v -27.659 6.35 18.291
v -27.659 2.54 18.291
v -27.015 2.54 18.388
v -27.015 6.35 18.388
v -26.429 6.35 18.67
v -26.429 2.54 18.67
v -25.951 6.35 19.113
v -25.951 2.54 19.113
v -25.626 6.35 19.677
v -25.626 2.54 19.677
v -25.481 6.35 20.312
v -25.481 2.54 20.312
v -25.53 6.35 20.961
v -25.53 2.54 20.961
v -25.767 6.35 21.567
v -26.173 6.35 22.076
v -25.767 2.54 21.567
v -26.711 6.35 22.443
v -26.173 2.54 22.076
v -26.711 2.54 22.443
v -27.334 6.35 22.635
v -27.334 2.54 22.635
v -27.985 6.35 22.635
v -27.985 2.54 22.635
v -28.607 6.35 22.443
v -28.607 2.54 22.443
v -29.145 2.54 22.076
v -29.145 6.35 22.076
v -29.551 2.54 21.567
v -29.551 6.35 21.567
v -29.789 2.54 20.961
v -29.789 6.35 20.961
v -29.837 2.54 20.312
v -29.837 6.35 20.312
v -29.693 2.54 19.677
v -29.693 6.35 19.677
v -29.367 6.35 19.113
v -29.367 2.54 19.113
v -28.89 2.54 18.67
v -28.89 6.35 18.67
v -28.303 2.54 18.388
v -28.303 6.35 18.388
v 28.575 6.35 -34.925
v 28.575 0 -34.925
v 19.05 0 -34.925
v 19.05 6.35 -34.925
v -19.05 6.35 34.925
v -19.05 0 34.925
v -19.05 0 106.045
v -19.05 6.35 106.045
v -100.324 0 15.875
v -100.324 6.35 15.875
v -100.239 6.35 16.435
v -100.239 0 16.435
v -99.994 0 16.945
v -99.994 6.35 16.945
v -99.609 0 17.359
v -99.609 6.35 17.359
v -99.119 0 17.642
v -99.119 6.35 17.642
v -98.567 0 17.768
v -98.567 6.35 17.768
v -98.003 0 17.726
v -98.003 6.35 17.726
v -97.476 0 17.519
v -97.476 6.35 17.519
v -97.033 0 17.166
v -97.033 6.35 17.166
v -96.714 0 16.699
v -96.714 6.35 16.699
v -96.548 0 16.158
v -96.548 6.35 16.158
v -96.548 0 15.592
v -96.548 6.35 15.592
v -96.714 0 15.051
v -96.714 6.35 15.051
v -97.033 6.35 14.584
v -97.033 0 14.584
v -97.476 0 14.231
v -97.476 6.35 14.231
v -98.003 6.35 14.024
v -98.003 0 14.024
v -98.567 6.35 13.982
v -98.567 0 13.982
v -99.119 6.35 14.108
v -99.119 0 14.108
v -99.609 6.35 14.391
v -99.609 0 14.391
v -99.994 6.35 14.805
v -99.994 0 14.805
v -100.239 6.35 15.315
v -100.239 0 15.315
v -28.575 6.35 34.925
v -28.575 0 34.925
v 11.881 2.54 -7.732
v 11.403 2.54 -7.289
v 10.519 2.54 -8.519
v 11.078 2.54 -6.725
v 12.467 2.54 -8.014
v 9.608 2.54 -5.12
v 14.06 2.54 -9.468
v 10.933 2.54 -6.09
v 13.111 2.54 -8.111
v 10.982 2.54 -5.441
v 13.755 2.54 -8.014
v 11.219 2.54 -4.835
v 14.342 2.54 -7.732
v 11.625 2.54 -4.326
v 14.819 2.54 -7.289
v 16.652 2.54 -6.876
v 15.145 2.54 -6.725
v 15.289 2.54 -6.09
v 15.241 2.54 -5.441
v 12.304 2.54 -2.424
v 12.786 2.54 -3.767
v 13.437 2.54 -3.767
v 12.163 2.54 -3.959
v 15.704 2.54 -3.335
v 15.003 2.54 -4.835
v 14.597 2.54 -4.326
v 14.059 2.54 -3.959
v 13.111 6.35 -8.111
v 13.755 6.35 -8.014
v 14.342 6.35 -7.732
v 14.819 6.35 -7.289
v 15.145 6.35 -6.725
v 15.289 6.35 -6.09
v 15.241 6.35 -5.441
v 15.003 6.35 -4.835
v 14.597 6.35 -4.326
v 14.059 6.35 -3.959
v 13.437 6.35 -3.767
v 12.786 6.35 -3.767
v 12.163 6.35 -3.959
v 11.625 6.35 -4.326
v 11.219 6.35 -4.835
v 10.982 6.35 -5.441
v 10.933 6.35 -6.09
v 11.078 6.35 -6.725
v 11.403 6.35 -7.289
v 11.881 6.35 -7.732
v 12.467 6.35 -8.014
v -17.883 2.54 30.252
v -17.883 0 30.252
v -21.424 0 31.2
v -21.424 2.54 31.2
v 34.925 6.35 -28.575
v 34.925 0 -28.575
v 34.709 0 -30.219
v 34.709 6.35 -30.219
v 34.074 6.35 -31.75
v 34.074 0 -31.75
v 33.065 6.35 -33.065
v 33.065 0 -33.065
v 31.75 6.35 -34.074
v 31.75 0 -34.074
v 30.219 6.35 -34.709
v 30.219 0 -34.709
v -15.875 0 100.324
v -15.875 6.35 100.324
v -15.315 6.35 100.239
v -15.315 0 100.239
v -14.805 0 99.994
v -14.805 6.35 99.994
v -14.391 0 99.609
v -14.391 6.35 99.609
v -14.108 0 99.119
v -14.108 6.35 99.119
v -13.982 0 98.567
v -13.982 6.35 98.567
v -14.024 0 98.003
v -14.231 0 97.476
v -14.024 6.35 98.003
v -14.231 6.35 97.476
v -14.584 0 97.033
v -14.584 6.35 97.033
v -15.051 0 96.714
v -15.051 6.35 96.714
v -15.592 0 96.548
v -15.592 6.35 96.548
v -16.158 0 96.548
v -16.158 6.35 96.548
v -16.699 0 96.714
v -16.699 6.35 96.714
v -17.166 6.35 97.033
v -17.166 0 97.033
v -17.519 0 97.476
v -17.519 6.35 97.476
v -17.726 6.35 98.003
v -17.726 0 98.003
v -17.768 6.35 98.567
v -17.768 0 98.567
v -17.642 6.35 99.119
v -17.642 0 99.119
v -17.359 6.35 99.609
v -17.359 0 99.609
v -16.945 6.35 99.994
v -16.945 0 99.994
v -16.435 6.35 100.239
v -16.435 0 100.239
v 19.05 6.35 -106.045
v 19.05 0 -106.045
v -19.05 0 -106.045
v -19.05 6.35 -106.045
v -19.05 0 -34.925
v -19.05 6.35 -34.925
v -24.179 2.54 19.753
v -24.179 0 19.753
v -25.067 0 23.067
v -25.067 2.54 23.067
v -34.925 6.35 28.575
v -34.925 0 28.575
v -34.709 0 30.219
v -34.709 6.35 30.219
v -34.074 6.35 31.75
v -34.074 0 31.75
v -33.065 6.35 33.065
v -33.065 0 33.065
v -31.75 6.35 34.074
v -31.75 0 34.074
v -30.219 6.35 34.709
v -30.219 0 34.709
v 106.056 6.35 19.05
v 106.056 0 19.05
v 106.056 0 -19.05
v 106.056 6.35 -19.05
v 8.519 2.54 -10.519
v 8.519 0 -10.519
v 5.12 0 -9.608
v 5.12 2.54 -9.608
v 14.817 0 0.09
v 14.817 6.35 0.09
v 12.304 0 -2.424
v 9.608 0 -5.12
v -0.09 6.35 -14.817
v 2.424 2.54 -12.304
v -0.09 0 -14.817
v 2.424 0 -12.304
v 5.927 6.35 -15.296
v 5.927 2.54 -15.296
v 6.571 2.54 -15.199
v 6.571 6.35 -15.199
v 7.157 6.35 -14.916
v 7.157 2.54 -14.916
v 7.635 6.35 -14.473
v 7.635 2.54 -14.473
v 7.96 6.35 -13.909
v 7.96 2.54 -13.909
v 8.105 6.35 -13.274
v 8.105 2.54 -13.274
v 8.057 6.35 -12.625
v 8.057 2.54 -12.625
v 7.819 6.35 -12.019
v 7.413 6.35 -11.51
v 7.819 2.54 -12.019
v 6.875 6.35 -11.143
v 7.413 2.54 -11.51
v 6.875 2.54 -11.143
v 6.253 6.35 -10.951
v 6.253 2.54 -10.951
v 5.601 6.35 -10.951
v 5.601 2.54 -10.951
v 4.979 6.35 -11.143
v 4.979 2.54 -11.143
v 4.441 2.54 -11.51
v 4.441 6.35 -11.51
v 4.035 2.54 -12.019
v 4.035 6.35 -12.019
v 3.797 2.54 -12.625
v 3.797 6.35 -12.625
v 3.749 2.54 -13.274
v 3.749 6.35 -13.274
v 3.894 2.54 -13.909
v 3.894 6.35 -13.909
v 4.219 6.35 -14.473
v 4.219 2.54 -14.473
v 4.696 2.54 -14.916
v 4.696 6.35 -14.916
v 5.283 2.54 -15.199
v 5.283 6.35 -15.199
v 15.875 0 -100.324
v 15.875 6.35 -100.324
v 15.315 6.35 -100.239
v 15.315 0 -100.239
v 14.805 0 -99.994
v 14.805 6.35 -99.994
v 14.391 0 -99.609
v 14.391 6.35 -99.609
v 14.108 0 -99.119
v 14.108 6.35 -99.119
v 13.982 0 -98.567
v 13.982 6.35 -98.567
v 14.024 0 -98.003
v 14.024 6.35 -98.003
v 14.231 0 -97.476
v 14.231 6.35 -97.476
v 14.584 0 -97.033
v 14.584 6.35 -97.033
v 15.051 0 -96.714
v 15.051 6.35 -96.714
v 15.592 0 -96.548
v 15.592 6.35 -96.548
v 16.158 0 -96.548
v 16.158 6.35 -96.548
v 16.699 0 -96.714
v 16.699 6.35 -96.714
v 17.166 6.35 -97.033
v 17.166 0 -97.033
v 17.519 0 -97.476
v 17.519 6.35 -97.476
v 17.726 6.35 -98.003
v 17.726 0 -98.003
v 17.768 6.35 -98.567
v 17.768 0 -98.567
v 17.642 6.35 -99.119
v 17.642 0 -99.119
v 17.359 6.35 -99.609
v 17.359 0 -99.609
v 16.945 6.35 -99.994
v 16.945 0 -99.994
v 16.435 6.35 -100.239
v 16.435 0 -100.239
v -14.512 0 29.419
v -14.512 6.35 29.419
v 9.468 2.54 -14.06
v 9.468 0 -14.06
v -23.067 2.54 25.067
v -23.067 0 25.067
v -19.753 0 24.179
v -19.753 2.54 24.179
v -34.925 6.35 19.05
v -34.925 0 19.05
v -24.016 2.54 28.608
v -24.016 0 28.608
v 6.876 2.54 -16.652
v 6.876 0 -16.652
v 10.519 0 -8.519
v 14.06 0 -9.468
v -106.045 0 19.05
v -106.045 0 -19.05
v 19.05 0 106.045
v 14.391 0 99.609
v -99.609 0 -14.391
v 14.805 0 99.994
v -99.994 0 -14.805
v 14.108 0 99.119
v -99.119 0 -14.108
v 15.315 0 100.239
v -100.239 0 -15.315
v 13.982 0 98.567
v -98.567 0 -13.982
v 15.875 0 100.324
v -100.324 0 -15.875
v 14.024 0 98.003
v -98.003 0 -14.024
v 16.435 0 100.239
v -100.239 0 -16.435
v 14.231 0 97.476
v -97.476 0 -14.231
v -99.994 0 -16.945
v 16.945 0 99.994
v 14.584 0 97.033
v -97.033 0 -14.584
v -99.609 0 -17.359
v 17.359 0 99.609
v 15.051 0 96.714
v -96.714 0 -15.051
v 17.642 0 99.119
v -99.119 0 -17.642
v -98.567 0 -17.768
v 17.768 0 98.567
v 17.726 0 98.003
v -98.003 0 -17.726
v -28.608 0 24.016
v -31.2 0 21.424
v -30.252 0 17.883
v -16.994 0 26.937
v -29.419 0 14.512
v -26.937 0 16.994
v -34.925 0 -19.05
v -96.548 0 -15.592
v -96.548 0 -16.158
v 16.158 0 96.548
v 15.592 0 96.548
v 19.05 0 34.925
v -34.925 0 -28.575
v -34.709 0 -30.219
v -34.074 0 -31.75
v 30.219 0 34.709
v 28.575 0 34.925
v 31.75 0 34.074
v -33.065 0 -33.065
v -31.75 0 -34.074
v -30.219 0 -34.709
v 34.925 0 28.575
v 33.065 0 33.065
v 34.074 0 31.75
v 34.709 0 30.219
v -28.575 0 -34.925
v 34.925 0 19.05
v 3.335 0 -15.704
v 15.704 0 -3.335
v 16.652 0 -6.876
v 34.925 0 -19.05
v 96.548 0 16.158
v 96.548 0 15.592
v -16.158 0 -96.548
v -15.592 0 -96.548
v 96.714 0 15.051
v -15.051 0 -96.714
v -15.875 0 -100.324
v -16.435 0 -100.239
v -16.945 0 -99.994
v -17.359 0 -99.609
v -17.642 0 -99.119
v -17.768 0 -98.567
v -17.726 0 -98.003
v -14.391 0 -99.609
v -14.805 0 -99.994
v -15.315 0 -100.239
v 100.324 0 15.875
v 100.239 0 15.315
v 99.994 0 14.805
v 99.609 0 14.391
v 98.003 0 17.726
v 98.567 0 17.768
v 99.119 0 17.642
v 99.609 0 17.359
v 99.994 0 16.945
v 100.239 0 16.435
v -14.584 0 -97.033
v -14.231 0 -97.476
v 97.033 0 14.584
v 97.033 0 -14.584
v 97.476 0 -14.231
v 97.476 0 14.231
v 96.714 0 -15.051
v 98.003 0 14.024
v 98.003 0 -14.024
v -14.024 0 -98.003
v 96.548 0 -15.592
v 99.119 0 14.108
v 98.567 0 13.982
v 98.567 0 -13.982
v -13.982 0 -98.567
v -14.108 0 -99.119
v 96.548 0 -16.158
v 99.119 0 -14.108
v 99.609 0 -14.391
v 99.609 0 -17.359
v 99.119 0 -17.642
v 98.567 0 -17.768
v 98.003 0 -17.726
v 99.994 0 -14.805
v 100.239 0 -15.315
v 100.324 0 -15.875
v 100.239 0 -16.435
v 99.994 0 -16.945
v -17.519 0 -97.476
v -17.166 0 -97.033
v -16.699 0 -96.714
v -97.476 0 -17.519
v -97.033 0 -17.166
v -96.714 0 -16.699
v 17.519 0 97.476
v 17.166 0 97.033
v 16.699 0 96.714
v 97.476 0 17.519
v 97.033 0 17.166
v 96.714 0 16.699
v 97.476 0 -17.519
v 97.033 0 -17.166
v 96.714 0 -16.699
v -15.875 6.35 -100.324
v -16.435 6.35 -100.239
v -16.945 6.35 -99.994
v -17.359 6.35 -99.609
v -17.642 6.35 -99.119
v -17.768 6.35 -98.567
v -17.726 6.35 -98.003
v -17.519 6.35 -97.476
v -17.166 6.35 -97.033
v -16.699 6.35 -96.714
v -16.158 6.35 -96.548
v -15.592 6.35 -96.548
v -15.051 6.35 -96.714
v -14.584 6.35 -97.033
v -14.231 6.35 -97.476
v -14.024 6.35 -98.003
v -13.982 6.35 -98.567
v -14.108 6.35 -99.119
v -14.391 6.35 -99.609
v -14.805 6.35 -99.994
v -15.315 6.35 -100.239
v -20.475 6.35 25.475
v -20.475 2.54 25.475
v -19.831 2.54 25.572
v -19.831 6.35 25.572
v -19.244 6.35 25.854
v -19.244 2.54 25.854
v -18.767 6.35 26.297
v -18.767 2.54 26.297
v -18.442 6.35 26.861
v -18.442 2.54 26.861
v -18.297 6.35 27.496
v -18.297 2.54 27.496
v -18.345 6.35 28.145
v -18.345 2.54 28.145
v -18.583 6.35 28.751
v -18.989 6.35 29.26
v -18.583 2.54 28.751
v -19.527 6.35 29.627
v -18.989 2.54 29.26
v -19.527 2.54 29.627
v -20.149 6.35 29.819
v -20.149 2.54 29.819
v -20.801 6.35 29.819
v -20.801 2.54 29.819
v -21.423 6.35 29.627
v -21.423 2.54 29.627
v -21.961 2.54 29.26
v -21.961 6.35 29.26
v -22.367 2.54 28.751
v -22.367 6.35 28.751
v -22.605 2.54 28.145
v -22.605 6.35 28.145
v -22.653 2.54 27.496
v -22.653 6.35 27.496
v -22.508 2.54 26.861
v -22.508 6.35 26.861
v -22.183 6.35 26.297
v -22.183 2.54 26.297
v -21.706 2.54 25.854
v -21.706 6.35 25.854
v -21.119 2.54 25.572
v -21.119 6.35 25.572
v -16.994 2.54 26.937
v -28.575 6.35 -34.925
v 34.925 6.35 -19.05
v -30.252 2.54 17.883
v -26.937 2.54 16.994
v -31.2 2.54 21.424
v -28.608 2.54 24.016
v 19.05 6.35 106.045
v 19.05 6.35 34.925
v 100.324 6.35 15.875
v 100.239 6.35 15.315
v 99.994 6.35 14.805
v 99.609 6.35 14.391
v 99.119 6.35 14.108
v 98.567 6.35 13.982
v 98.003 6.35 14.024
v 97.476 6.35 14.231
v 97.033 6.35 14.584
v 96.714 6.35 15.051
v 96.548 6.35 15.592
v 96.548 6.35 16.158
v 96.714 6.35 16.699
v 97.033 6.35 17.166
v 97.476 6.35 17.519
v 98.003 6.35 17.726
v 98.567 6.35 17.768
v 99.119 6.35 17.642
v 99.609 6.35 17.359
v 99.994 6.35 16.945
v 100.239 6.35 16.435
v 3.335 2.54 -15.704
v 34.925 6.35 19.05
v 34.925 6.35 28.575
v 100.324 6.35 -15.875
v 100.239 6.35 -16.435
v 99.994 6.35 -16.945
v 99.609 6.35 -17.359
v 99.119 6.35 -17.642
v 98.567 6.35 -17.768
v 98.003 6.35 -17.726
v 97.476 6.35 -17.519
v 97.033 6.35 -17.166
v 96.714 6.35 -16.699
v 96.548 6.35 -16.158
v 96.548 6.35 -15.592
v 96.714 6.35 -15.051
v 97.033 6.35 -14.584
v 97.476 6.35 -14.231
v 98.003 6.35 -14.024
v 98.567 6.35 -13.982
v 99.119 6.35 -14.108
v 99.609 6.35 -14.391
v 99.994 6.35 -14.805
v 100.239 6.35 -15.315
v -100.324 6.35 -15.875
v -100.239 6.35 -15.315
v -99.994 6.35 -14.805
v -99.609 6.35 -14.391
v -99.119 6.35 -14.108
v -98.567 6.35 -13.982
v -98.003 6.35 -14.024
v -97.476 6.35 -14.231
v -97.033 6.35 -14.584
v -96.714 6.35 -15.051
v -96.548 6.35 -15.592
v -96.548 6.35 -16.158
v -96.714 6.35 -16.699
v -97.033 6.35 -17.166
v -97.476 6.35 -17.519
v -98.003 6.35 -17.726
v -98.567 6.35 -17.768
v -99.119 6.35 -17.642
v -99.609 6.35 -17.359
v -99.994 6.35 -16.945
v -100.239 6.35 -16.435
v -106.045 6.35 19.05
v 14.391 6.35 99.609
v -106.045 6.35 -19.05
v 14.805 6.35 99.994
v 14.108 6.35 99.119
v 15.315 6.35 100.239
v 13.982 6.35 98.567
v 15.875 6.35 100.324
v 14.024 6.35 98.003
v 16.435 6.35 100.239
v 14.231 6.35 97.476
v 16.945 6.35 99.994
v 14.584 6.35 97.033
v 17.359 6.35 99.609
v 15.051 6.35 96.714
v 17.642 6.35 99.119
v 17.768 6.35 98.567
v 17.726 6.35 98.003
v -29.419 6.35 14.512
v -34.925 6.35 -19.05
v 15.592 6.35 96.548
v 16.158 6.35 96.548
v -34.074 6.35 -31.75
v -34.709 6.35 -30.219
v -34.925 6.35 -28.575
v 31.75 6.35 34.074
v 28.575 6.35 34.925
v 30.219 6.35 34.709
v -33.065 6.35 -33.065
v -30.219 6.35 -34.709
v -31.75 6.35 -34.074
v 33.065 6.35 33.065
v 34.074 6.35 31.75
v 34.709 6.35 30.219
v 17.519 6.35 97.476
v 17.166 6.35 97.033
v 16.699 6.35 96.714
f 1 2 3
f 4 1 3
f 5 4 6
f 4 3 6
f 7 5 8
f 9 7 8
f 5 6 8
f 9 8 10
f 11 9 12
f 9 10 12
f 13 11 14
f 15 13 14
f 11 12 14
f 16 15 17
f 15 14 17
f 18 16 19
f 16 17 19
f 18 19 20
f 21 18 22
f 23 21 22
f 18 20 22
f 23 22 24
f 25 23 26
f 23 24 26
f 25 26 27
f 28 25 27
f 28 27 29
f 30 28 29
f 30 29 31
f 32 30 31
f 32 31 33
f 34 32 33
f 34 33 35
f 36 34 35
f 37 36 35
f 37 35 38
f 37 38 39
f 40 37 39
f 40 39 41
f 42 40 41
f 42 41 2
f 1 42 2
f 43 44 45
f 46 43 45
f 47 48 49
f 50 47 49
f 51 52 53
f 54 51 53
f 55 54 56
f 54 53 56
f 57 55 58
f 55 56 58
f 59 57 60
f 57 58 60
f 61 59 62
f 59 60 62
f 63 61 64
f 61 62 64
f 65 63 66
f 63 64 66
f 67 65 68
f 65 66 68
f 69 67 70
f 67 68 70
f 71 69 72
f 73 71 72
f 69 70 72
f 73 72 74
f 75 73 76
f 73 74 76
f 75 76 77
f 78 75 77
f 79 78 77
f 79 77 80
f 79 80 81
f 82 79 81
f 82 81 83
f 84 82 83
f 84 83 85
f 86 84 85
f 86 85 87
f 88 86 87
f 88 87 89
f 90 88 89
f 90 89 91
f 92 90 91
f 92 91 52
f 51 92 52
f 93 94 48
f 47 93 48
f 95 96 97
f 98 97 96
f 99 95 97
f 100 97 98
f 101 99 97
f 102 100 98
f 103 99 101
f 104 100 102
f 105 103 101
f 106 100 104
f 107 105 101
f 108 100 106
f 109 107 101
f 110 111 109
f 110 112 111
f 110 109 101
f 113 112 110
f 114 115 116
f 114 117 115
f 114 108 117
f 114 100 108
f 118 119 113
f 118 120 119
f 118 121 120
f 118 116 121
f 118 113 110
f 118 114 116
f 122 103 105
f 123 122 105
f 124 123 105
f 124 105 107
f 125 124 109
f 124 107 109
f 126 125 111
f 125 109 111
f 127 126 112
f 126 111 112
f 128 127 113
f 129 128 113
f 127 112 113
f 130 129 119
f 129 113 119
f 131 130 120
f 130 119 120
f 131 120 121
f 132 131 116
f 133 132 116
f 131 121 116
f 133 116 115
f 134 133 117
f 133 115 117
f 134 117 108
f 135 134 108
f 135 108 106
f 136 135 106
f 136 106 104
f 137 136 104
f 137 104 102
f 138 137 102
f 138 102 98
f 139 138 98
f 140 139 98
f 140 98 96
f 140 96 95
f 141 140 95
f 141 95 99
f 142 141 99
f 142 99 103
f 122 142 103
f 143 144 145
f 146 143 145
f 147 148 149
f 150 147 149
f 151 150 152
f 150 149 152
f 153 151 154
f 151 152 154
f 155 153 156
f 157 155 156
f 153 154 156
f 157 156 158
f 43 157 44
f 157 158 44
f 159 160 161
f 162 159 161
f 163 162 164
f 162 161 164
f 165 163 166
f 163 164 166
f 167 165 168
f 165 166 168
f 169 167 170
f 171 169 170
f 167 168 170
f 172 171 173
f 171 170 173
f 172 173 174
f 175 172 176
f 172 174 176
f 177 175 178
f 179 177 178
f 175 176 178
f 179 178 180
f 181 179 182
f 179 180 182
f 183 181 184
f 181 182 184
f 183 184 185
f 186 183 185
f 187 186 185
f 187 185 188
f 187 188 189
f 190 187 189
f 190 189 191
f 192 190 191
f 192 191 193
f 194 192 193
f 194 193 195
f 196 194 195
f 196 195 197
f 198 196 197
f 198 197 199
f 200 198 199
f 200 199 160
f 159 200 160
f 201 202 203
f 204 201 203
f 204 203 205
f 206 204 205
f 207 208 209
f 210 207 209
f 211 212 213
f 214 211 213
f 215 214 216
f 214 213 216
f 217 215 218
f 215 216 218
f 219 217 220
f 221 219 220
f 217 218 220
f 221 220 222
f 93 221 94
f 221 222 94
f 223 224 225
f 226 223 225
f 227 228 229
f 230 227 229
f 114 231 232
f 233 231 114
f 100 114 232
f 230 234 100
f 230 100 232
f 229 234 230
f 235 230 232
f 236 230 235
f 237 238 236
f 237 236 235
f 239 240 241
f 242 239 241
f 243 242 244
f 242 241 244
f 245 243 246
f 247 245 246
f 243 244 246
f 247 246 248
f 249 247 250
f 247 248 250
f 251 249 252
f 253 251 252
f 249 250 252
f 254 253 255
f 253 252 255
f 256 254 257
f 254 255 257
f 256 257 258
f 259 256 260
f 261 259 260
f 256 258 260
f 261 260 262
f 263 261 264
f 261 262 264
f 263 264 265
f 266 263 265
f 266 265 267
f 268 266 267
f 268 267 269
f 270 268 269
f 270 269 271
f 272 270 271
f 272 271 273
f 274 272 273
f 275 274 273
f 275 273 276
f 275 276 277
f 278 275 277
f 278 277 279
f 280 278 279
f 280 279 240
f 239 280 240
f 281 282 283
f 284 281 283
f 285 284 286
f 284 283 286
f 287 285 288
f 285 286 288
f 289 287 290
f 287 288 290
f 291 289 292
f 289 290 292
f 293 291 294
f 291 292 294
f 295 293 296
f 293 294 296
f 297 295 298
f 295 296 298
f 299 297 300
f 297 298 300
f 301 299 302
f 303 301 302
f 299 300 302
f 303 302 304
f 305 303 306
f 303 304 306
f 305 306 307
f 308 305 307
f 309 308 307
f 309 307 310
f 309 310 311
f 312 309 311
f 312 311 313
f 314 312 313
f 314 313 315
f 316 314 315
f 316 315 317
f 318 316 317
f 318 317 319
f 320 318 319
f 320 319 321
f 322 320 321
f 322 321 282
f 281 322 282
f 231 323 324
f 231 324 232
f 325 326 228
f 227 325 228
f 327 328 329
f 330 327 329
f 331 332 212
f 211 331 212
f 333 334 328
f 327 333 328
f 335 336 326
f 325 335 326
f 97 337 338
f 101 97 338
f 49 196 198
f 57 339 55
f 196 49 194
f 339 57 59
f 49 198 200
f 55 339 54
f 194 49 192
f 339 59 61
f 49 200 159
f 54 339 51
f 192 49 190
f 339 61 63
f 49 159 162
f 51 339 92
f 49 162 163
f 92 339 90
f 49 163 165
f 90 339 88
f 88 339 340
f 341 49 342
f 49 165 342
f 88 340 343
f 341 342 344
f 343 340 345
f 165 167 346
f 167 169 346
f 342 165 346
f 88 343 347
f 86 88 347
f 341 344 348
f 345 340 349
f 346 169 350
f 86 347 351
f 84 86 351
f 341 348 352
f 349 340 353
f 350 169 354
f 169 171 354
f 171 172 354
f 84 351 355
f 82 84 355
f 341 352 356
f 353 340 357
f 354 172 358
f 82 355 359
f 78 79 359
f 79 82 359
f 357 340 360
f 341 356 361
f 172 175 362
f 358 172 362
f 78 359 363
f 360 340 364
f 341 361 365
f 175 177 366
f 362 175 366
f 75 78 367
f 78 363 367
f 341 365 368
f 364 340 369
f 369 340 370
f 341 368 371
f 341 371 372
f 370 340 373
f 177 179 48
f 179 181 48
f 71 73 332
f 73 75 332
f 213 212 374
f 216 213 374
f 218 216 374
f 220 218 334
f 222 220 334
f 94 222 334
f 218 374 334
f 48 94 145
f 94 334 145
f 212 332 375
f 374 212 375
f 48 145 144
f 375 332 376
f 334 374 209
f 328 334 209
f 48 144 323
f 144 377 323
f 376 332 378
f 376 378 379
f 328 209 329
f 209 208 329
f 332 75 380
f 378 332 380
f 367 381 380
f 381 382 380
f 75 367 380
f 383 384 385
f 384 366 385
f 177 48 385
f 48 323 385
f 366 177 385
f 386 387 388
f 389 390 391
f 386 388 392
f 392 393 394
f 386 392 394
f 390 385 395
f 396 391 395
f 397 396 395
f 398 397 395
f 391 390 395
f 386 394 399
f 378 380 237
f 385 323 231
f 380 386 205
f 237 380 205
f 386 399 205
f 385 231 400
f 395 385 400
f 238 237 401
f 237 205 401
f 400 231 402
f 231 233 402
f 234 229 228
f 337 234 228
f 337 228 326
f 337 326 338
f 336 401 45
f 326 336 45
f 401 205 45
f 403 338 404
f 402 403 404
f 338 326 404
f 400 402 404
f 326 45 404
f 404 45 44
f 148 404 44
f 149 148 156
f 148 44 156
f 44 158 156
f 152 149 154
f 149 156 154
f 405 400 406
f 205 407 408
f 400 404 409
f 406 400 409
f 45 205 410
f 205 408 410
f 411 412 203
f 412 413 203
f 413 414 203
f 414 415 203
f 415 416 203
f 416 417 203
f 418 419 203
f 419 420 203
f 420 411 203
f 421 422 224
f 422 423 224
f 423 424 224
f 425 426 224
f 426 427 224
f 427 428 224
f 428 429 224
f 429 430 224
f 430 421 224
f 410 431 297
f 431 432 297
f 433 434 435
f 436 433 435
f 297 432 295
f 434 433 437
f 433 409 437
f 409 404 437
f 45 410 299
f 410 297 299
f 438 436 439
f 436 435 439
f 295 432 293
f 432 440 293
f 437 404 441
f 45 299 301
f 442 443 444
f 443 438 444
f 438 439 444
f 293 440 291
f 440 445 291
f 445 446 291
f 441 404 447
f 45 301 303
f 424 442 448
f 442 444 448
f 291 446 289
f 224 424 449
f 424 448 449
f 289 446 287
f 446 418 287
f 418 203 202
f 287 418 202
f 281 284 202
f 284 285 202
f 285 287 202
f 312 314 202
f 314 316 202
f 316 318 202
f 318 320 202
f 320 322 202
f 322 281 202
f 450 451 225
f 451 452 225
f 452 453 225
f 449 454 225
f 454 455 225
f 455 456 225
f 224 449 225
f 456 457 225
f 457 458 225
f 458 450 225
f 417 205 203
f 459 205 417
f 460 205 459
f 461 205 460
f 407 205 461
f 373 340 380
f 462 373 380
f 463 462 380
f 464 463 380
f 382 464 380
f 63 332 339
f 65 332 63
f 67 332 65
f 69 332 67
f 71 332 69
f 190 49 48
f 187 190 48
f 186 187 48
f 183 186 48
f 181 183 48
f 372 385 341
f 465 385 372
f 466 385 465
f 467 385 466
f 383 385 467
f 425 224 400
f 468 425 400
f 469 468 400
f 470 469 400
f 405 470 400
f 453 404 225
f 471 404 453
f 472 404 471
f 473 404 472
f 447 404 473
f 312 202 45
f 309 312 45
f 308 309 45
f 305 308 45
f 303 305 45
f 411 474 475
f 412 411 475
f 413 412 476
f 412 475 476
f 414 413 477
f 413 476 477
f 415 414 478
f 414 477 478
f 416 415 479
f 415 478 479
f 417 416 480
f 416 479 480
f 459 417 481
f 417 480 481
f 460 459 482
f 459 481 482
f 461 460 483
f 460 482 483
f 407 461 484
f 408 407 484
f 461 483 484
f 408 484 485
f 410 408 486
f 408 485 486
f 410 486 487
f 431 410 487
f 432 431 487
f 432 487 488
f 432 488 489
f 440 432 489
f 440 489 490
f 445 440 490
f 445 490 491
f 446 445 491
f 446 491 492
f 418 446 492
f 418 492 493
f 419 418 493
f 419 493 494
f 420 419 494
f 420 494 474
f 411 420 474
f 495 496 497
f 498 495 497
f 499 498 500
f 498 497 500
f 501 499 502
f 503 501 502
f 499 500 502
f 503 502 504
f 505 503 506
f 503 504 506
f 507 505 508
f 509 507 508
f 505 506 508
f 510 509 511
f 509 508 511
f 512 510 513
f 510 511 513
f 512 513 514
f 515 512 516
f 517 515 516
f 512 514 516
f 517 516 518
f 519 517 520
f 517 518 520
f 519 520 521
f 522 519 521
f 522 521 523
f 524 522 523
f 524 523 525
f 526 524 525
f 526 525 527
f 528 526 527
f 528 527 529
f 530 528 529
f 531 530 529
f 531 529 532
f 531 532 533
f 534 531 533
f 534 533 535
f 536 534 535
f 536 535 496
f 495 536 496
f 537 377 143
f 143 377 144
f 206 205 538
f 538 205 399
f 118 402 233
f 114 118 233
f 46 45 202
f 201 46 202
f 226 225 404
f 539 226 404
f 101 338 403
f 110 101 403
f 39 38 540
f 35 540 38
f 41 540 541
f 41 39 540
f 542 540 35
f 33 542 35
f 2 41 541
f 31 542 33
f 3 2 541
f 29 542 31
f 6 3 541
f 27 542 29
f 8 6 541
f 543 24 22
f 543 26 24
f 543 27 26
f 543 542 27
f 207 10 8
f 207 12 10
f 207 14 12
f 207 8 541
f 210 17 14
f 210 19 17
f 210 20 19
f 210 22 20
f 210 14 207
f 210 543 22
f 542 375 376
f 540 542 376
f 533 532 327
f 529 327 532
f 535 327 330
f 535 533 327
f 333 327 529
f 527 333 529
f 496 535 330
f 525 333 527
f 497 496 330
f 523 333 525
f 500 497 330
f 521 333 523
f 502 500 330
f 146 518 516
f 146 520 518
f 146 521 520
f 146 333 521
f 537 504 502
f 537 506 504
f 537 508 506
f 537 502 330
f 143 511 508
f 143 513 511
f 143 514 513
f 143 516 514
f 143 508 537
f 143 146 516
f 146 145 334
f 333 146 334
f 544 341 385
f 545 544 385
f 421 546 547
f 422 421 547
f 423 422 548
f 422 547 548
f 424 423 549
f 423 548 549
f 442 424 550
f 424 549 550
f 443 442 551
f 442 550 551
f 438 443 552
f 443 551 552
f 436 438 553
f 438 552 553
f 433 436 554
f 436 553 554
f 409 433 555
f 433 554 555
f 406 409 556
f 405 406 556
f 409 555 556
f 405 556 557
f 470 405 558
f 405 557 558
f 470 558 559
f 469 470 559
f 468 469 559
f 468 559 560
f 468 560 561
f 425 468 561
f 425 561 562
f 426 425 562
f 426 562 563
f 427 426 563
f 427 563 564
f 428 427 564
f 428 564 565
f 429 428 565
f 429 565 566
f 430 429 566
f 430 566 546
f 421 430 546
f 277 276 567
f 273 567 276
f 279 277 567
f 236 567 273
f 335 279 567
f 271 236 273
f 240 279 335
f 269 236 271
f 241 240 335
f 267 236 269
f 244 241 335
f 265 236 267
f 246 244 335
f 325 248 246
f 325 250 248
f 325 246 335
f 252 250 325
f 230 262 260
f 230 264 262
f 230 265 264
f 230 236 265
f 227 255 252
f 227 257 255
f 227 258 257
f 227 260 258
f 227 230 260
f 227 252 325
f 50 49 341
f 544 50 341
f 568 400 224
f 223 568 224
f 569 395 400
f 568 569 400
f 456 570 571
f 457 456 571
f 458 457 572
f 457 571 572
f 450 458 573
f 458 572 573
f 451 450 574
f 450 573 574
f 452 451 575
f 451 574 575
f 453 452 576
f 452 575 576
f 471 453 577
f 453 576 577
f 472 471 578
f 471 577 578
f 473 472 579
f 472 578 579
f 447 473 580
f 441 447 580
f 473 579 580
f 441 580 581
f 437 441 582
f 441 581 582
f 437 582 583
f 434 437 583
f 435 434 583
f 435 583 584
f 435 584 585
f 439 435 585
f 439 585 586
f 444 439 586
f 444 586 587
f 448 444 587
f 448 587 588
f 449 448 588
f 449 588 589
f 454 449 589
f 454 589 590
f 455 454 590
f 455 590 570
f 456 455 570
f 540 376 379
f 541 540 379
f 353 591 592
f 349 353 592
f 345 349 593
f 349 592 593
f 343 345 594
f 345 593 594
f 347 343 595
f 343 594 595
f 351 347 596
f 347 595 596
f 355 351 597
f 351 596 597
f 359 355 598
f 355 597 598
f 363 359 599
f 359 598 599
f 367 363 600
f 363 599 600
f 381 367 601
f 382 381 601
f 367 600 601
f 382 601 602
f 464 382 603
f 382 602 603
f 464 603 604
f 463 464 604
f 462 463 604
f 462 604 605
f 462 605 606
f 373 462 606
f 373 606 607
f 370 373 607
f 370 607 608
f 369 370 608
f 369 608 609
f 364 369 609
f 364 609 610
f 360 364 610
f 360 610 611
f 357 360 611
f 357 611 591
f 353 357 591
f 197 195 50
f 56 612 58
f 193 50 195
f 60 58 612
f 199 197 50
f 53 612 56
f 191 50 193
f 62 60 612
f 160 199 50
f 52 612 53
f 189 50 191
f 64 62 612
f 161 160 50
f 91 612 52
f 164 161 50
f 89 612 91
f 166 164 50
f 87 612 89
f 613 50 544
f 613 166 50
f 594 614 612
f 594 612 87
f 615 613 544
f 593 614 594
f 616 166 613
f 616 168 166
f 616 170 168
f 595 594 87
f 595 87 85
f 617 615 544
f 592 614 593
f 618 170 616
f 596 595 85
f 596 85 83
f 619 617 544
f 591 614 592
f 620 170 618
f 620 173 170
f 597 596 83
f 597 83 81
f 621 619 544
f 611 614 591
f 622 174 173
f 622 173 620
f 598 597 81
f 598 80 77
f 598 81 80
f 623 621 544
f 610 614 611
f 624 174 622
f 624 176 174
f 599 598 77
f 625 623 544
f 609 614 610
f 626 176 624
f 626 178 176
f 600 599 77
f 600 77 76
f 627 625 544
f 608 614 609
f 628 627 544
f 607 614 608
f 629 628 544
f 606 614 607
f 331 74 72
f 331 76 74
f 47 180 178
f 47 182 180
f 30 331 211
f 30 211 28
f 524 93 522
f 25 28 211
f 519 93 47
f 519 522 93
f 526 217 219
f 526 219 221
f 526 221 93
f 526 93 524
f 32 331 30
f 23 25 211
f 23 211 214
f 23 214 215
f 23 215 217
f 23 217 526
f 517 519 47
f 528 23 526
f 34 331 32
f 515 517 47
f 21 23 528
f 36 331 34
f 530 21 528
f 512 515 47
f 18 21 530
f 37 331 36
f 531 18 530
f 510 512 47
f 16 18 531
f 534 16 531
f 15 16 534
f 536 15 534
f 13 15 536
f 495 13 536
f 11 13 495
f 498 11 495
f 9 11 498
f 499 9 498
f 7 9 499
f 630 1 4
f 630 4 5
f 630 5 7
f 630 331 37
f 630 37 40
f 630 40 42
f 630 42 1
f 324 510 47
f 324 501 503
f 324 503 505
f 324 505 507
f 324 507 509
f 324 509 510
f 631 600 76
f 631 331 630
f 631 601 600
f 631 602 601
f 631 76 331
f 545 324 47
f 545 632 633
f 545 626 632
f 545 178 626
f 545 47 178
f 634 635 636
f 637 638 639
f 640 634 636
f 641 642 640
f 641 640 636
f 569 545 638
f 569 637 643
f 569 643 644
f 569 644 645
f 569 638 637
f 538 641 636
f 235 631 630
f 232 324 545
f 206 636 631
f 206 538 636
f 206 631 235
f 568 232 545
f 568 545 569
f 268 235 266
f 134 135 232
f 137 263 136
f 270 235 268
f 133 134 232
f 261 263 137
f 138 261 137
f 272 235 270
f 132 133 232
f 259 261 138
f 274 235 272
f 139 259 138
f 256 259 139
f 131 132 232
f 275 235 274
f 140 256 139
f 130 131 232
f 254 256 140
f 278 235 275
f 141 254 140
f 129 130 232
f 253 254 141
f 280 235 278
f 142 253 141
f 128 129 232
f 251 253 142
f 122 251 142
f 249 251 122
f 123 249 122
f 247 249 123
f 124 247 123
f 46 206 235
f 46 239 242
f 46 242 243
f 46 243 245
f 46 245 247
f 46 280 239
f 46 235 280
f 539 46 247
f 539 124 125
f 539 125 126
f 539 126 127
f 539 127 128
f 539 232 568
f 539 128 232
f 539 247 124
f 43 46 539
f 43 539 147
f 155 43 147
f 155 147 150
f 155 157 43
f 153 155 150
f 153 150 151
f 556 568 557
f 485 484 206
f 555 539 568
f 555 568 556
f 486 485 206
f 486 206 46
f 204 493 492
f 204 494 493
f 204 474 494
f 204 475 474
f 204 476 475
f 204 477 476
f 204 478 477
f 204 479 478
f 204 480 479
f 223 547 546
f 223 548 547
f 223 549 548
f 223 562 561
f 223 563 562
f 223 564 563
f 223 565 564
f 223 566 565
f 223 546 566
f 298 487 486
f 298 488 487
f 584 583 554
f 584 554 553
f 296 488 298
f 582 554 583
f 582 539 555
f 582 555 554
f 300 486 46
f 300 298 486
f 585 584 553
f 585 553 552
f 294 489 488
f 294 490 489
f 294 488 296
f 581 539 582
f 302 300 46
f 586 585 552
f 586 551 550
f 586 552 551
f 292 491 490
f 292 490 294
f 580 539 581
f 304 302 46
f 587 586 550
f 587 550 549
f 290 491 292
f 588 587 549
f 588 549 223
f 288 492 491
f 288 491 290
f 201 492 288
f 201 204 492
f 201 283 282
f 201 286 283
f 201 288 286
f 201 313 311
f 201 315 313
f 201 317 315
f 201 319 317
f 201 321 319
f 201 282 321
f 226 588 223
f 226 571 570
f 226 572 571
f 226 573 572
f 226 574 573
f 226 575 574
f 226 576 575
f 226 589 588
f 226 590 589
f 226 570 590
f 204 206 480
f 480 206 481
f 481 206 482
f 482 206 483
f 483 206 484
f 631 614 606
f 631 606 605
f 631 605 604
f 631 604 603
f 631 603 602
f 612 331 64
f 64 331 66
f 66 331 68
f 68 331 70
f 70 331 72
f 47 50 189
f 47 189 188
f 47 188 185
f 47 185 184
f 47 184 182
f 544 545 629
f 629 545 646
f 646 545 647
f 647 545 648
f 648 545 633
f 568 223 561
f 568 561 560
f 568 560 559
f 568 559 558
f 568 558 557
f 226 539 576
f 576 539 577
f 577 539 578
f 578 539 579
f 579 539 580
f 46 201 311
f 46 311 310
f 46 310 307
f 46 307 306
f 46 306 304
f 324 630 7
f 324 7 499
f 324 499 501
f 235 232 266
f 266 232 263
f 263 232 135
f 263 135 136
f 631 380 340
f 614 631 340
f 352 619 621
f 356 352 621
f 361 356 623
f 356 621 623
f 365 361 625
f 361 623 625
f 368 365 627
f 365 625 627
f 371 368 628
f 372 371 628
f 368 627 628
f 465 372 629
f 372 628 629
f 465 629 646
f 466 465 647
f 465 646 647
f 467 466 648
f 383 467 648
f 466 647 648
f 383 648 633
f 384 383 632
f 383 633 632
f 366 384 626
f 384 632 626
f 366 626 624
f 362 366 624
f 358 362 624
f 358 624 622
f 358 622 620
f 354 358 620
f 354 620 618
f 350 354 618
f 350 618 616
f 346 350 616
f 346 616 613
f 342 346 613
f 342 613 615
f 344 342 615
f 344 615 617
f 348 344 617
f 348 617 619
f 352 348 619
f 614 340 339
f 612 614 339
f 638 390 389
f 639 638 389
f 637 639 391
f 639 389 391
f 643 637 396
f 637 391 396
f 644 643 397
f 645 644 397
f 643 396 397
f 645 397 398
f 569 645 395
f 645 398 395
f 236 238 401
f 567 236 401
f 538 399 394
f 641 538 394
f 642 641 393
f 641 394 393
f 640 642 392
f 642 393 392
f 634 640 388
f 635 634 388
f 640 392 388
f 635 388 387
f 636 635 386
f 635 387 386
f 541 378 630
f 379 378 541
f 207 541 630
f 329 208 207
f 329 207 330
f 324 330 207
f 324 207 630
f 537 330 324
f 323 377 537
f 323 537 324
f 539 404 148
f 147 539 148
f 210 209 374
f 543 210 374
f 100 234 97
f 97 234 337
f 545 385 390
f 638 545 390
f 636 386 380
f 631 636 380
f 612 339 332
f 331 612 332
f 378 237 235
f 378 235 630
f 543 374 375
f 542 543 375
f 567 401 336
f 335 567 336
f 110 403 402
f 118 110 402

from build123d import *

# Parameters (mm, degrees)
BOSS_EXTRU_1_DEPTH           = 6.35
ENL_V_MAT_EXTRU_1_REACH      = 152.112
ESQUISSE2_R                  = 2.1844
ENL_V_MAT_EXTRU_2_DEPTH      = 2.54
ENL_V_MAT_EXTRU_3_REACH      = 152.112
ESQUISSE5_R                  = 1.89865
ENL_V_MAT_EXTRU_4_DEPTH      = 151.112071772
R_P_TITION_CIRCULAIRE1_COUNT = 4


with BuildPart() as part:
    # Esquisse1 → Boss.-Extru.1 (new body)
    with BuildSketch(Plane(origin=(0, 0, 0), x_dir=(1, 0, 0), z_dir=(0, 1, 0))):
        with BuildLine():
            Line((19.049999994, 106.045), (-19.050000006, 106.045))
            Line((-19.050000006, 106.045), (-19.050000006, 34.925))
            Line((-19.050000006, 34.925), (-28.575, 34.925))
            ThreePointArc((-28.575, 34.925), (-33.065128061, 33.065128061), (-34.925, 28.575))
            Line((-34.925, 28.575), (-34.925, 19.05))
            Line((-34.925, 19.05), (-106.045, 19.05))
            Line((-106.045, 19.05), (-106.045, -19.05))
            Line((-106.045, -19.05), (-34.925, -19.05))
            Line((-34.925, -19.05), (-34.925, -28.575))
            ThreePointArc((-34.925, -28.575), (-33.065128061, -33.065128061), (-28.575, -34.925))
            Line((-28.575, -34.925), (-19.05, -34.925))
            Line((-19.05, -34.925), (-19.05, -106.045))
            Line((-19.05, -106.045), (19.05, -106.045))
            Line((19.05, -106.045), (19.05, -34.925))
            Line((19.05, -34.925), (28.575, -34.925))
            ThreePointArc((28.575, -34.925), (33.065128061, -33.065128061), (34.925, -28.575))
            Line((34.925, -28.575), (34.925, -19.05))
            Line((34.925, -19.05), (106.055502293, -19.05))
            Line((106.055502293, -19.05), (106.055502293, 19.05))
            Line((106.055502293, 19.05), (34.925, 19.05))
            Line((34.925, 19.05), (34.925, 28.575))
            ThreePointArc((34.925, 28.575), (33.065128061, 33.065128061), (28.575, 34.925))
            Line((28.575, 34.925), (19.049999994, 34.925))
            Line((19.049999994, 34.925), (19.049999994, 106.045))
        make_face()
    extrude(amount=BOSS_EXTRU_1_DEPTH)

    # Esquisse2 → Enlèv. mat.-Extru.1 (cut, up to next)
    with BuildSketch(Plane.XZ, mode=Mode.PRIVATE) as enl_v_mat_extru_1_sk1:
        with Locations(Location((-20.474983956, 27.659188853, 0), (0, 0, 270))):
            Circle(ESQUISSE2_R)
    enl_v_mat_extru_1_tool1 = extrude(enl_v_mat_extru_1_sk1.sketch, amount=-ENL_V_MAT_EXTRU_1_REACH, mode=Mode.PRIVATE) & part.part
    # Esquisse2 → Enlèv. mat.-Extru.1 (cut, up to next)
    with BuildSketch(Plane.XZ, mode=Mode.PRIVATE) as enl_v_mat_extru_1_sk2:
        with Locations(Location((-27.659188853, 20.474983956, 0), (0, 0, 270))):
            Circle(ESQUISSE2_R)
    enl_v_mat_extru_1_tool2 = extrude(enl_v_mat_extru_1_sk2.sketch, amount=-ENL_V_MAT_EXTRU_1_REACH, mode=Mode.PRIVATE) & part.part
    # Esquisse2 → Enlèv. mat.-Extru.1 (cut, up to next)
    with BuildSketch(Plane.XZ, mode=Mode.PRIVATE) as enl_v_mat_extru_1_sk3:
        with Locations(Location((13.111173937, -5.92696904, 0), (0, 0, 270))):
            Circle(ESQUISSE2_R)
    enl_v_mat_extru_1_tool3 = extrude(enl_v_mat_extru_1_sk3.sketch, amount=-ENL_V_MAT_EXTRU_1_REACH, mode=Mode.PRIVATE) & part.part
    # Esquisse2 → Enlèv. mat.-Extru.1 (cut, up to next)
    with BuildSketch(Plane.XZ, mode=Mode.PRIVATE) as enl_v_mat_extru_1_sk4:
        with Locations(Location((5.92696904, -13.111173937, 0), (0, 0, 270))):
            Circle(ESQUISSE2_R)
    enl_v_mat_extru_1_tool4 = extrude(enl_v_mat_extru_1_sk4.sketch, amount=-ENL_V_MAT_EXTRU_1_REACH, mode=Mode.PRIVATE) & part.part
    add(enl_v_mat_extru_1_tool1.solids().sort_by_distance((-20.474984, 0, 27.659189))[0], mode=Mode.SUBTRACT)
    add(enl_v_mat_extru_1_tool2.solids().sort_by_distance((-27.659189, 0, 20.474984))[0], mode=Mode.SUBTRACT)
    add(enl_v_mat_extru_1_tool3.solids().sort_by_distance((13.111174, 0, -5.926969))[0], mode=Mode.SUBTRACT)
    add(enl_v_mat_extru_1_tool4.solids().sort_by_distance((5.926969, 0, -13.111174))[0], mode=Mode.SUBTRACT)

    # Esquisse3 → Enlèv. mat.-Extru.2 (cut)
    with BuildSketch(Plane.XZ):
        Polygon((16.652426289, -6.875844748), (15.703550581, -3.334592395), (12.162298229, -2.385716687), (9.569921584, -4.978093332), (10.518797292, -8.519345684), (14.060049645, -9.468221392), align=None)
        Polygon((9.468221392, -14.060049645), (8.519345684, -10.518797292), (4.978093332, -9.569921584), (2.385716687, -12.162298229), (3.334592395, -15.703550581), (6.875844748, -16.652426289), align=None)
        Polygon((-17.882607312, 30.251565497), (-21.423859664, 31.200441205), (-24.016236309, 28.608064561), (-23.0673606, 25.066812208), (-19.526108248, 24.1179365), (-16.933731604, 26.710313145), align=None)
        Polygon((-28.608064561, 24.016236309), (-31.200441205, 21.423859664), (-30.251565497, 17.882607312), (-26.710313145, 16.933731604), (-24.1179365, 19.526108248), (-25.066812208, 23.0673606), align=None)
    extrude(amount=-ENL_V_MAT_EXTRU_2_DEPTH, mode=Mode.SUBTRACT)

    # Esquisse4 → Enlèv. mat.-Extru.3 (cut, up to next)
    with BuildSketch(Plane.XZ, mode=Mode.PRIVATE) as enl_v_mat_extru_3_sk1:
        Polygon((-29.419319053, 14.512093892), (-14.512093892, 29.419319053), (14.8174226, 0.089802561), (-0.089802561, -14.8174226), align=None)
    enl_v_mat_extru_3_tool1 = extrude(enl_v_mat_extru_3_sk1.sketch, amount=-ENL_V_MAT_EXTRU_3_REACH, mode=Mode.PRIVATE) & part.part
    add(enl_v_mat_extru_3_tool1.solids().sort_by_distance((-7.300948, 0, 7.300948))[0], mode=Mode.SUBTRACT)

    # Esquisse5 → Enlèv. mat.-Extru.4 (cut, through all)
    with BuildSketch(Plane(origin=(0, 6.35, 0), x_dir=(1, 0, 0), z_dir=(0, 1, 0))):
        with Locations(Location((15.875, -98.425, 0), (0, 0, 270))):
            Circle(ESQUISSE5_R)
        with Locations(Location((-15.875, -98.425, 0), (0, 0, 270))):
            Circle(ESQUISSE5_R)
    enl_v_mat_extru_4 = extrude(amount=-ENL_V_MAT_EXTRU_4_DEPTH, mode=Mode.SUBTRACT)

    # Répétition circulaire1: Enlèv. mat.-Extru.4 ×4 about axis
    r_p_tition_circulaire1_axis = Axis((0, 0, 0), (0, 1, 0))
    for i in range(1, R_P_TITION_CIRCULAIRE1_COUNT):
        add(enl_v_mat_extru_4.rotate(r_p_tition_circulaire1_axis, i * 360 / R_P_TITION_CIRCULAIRE1_COUNT), mode=Mode.SUBTRACT)


solid = part.part
